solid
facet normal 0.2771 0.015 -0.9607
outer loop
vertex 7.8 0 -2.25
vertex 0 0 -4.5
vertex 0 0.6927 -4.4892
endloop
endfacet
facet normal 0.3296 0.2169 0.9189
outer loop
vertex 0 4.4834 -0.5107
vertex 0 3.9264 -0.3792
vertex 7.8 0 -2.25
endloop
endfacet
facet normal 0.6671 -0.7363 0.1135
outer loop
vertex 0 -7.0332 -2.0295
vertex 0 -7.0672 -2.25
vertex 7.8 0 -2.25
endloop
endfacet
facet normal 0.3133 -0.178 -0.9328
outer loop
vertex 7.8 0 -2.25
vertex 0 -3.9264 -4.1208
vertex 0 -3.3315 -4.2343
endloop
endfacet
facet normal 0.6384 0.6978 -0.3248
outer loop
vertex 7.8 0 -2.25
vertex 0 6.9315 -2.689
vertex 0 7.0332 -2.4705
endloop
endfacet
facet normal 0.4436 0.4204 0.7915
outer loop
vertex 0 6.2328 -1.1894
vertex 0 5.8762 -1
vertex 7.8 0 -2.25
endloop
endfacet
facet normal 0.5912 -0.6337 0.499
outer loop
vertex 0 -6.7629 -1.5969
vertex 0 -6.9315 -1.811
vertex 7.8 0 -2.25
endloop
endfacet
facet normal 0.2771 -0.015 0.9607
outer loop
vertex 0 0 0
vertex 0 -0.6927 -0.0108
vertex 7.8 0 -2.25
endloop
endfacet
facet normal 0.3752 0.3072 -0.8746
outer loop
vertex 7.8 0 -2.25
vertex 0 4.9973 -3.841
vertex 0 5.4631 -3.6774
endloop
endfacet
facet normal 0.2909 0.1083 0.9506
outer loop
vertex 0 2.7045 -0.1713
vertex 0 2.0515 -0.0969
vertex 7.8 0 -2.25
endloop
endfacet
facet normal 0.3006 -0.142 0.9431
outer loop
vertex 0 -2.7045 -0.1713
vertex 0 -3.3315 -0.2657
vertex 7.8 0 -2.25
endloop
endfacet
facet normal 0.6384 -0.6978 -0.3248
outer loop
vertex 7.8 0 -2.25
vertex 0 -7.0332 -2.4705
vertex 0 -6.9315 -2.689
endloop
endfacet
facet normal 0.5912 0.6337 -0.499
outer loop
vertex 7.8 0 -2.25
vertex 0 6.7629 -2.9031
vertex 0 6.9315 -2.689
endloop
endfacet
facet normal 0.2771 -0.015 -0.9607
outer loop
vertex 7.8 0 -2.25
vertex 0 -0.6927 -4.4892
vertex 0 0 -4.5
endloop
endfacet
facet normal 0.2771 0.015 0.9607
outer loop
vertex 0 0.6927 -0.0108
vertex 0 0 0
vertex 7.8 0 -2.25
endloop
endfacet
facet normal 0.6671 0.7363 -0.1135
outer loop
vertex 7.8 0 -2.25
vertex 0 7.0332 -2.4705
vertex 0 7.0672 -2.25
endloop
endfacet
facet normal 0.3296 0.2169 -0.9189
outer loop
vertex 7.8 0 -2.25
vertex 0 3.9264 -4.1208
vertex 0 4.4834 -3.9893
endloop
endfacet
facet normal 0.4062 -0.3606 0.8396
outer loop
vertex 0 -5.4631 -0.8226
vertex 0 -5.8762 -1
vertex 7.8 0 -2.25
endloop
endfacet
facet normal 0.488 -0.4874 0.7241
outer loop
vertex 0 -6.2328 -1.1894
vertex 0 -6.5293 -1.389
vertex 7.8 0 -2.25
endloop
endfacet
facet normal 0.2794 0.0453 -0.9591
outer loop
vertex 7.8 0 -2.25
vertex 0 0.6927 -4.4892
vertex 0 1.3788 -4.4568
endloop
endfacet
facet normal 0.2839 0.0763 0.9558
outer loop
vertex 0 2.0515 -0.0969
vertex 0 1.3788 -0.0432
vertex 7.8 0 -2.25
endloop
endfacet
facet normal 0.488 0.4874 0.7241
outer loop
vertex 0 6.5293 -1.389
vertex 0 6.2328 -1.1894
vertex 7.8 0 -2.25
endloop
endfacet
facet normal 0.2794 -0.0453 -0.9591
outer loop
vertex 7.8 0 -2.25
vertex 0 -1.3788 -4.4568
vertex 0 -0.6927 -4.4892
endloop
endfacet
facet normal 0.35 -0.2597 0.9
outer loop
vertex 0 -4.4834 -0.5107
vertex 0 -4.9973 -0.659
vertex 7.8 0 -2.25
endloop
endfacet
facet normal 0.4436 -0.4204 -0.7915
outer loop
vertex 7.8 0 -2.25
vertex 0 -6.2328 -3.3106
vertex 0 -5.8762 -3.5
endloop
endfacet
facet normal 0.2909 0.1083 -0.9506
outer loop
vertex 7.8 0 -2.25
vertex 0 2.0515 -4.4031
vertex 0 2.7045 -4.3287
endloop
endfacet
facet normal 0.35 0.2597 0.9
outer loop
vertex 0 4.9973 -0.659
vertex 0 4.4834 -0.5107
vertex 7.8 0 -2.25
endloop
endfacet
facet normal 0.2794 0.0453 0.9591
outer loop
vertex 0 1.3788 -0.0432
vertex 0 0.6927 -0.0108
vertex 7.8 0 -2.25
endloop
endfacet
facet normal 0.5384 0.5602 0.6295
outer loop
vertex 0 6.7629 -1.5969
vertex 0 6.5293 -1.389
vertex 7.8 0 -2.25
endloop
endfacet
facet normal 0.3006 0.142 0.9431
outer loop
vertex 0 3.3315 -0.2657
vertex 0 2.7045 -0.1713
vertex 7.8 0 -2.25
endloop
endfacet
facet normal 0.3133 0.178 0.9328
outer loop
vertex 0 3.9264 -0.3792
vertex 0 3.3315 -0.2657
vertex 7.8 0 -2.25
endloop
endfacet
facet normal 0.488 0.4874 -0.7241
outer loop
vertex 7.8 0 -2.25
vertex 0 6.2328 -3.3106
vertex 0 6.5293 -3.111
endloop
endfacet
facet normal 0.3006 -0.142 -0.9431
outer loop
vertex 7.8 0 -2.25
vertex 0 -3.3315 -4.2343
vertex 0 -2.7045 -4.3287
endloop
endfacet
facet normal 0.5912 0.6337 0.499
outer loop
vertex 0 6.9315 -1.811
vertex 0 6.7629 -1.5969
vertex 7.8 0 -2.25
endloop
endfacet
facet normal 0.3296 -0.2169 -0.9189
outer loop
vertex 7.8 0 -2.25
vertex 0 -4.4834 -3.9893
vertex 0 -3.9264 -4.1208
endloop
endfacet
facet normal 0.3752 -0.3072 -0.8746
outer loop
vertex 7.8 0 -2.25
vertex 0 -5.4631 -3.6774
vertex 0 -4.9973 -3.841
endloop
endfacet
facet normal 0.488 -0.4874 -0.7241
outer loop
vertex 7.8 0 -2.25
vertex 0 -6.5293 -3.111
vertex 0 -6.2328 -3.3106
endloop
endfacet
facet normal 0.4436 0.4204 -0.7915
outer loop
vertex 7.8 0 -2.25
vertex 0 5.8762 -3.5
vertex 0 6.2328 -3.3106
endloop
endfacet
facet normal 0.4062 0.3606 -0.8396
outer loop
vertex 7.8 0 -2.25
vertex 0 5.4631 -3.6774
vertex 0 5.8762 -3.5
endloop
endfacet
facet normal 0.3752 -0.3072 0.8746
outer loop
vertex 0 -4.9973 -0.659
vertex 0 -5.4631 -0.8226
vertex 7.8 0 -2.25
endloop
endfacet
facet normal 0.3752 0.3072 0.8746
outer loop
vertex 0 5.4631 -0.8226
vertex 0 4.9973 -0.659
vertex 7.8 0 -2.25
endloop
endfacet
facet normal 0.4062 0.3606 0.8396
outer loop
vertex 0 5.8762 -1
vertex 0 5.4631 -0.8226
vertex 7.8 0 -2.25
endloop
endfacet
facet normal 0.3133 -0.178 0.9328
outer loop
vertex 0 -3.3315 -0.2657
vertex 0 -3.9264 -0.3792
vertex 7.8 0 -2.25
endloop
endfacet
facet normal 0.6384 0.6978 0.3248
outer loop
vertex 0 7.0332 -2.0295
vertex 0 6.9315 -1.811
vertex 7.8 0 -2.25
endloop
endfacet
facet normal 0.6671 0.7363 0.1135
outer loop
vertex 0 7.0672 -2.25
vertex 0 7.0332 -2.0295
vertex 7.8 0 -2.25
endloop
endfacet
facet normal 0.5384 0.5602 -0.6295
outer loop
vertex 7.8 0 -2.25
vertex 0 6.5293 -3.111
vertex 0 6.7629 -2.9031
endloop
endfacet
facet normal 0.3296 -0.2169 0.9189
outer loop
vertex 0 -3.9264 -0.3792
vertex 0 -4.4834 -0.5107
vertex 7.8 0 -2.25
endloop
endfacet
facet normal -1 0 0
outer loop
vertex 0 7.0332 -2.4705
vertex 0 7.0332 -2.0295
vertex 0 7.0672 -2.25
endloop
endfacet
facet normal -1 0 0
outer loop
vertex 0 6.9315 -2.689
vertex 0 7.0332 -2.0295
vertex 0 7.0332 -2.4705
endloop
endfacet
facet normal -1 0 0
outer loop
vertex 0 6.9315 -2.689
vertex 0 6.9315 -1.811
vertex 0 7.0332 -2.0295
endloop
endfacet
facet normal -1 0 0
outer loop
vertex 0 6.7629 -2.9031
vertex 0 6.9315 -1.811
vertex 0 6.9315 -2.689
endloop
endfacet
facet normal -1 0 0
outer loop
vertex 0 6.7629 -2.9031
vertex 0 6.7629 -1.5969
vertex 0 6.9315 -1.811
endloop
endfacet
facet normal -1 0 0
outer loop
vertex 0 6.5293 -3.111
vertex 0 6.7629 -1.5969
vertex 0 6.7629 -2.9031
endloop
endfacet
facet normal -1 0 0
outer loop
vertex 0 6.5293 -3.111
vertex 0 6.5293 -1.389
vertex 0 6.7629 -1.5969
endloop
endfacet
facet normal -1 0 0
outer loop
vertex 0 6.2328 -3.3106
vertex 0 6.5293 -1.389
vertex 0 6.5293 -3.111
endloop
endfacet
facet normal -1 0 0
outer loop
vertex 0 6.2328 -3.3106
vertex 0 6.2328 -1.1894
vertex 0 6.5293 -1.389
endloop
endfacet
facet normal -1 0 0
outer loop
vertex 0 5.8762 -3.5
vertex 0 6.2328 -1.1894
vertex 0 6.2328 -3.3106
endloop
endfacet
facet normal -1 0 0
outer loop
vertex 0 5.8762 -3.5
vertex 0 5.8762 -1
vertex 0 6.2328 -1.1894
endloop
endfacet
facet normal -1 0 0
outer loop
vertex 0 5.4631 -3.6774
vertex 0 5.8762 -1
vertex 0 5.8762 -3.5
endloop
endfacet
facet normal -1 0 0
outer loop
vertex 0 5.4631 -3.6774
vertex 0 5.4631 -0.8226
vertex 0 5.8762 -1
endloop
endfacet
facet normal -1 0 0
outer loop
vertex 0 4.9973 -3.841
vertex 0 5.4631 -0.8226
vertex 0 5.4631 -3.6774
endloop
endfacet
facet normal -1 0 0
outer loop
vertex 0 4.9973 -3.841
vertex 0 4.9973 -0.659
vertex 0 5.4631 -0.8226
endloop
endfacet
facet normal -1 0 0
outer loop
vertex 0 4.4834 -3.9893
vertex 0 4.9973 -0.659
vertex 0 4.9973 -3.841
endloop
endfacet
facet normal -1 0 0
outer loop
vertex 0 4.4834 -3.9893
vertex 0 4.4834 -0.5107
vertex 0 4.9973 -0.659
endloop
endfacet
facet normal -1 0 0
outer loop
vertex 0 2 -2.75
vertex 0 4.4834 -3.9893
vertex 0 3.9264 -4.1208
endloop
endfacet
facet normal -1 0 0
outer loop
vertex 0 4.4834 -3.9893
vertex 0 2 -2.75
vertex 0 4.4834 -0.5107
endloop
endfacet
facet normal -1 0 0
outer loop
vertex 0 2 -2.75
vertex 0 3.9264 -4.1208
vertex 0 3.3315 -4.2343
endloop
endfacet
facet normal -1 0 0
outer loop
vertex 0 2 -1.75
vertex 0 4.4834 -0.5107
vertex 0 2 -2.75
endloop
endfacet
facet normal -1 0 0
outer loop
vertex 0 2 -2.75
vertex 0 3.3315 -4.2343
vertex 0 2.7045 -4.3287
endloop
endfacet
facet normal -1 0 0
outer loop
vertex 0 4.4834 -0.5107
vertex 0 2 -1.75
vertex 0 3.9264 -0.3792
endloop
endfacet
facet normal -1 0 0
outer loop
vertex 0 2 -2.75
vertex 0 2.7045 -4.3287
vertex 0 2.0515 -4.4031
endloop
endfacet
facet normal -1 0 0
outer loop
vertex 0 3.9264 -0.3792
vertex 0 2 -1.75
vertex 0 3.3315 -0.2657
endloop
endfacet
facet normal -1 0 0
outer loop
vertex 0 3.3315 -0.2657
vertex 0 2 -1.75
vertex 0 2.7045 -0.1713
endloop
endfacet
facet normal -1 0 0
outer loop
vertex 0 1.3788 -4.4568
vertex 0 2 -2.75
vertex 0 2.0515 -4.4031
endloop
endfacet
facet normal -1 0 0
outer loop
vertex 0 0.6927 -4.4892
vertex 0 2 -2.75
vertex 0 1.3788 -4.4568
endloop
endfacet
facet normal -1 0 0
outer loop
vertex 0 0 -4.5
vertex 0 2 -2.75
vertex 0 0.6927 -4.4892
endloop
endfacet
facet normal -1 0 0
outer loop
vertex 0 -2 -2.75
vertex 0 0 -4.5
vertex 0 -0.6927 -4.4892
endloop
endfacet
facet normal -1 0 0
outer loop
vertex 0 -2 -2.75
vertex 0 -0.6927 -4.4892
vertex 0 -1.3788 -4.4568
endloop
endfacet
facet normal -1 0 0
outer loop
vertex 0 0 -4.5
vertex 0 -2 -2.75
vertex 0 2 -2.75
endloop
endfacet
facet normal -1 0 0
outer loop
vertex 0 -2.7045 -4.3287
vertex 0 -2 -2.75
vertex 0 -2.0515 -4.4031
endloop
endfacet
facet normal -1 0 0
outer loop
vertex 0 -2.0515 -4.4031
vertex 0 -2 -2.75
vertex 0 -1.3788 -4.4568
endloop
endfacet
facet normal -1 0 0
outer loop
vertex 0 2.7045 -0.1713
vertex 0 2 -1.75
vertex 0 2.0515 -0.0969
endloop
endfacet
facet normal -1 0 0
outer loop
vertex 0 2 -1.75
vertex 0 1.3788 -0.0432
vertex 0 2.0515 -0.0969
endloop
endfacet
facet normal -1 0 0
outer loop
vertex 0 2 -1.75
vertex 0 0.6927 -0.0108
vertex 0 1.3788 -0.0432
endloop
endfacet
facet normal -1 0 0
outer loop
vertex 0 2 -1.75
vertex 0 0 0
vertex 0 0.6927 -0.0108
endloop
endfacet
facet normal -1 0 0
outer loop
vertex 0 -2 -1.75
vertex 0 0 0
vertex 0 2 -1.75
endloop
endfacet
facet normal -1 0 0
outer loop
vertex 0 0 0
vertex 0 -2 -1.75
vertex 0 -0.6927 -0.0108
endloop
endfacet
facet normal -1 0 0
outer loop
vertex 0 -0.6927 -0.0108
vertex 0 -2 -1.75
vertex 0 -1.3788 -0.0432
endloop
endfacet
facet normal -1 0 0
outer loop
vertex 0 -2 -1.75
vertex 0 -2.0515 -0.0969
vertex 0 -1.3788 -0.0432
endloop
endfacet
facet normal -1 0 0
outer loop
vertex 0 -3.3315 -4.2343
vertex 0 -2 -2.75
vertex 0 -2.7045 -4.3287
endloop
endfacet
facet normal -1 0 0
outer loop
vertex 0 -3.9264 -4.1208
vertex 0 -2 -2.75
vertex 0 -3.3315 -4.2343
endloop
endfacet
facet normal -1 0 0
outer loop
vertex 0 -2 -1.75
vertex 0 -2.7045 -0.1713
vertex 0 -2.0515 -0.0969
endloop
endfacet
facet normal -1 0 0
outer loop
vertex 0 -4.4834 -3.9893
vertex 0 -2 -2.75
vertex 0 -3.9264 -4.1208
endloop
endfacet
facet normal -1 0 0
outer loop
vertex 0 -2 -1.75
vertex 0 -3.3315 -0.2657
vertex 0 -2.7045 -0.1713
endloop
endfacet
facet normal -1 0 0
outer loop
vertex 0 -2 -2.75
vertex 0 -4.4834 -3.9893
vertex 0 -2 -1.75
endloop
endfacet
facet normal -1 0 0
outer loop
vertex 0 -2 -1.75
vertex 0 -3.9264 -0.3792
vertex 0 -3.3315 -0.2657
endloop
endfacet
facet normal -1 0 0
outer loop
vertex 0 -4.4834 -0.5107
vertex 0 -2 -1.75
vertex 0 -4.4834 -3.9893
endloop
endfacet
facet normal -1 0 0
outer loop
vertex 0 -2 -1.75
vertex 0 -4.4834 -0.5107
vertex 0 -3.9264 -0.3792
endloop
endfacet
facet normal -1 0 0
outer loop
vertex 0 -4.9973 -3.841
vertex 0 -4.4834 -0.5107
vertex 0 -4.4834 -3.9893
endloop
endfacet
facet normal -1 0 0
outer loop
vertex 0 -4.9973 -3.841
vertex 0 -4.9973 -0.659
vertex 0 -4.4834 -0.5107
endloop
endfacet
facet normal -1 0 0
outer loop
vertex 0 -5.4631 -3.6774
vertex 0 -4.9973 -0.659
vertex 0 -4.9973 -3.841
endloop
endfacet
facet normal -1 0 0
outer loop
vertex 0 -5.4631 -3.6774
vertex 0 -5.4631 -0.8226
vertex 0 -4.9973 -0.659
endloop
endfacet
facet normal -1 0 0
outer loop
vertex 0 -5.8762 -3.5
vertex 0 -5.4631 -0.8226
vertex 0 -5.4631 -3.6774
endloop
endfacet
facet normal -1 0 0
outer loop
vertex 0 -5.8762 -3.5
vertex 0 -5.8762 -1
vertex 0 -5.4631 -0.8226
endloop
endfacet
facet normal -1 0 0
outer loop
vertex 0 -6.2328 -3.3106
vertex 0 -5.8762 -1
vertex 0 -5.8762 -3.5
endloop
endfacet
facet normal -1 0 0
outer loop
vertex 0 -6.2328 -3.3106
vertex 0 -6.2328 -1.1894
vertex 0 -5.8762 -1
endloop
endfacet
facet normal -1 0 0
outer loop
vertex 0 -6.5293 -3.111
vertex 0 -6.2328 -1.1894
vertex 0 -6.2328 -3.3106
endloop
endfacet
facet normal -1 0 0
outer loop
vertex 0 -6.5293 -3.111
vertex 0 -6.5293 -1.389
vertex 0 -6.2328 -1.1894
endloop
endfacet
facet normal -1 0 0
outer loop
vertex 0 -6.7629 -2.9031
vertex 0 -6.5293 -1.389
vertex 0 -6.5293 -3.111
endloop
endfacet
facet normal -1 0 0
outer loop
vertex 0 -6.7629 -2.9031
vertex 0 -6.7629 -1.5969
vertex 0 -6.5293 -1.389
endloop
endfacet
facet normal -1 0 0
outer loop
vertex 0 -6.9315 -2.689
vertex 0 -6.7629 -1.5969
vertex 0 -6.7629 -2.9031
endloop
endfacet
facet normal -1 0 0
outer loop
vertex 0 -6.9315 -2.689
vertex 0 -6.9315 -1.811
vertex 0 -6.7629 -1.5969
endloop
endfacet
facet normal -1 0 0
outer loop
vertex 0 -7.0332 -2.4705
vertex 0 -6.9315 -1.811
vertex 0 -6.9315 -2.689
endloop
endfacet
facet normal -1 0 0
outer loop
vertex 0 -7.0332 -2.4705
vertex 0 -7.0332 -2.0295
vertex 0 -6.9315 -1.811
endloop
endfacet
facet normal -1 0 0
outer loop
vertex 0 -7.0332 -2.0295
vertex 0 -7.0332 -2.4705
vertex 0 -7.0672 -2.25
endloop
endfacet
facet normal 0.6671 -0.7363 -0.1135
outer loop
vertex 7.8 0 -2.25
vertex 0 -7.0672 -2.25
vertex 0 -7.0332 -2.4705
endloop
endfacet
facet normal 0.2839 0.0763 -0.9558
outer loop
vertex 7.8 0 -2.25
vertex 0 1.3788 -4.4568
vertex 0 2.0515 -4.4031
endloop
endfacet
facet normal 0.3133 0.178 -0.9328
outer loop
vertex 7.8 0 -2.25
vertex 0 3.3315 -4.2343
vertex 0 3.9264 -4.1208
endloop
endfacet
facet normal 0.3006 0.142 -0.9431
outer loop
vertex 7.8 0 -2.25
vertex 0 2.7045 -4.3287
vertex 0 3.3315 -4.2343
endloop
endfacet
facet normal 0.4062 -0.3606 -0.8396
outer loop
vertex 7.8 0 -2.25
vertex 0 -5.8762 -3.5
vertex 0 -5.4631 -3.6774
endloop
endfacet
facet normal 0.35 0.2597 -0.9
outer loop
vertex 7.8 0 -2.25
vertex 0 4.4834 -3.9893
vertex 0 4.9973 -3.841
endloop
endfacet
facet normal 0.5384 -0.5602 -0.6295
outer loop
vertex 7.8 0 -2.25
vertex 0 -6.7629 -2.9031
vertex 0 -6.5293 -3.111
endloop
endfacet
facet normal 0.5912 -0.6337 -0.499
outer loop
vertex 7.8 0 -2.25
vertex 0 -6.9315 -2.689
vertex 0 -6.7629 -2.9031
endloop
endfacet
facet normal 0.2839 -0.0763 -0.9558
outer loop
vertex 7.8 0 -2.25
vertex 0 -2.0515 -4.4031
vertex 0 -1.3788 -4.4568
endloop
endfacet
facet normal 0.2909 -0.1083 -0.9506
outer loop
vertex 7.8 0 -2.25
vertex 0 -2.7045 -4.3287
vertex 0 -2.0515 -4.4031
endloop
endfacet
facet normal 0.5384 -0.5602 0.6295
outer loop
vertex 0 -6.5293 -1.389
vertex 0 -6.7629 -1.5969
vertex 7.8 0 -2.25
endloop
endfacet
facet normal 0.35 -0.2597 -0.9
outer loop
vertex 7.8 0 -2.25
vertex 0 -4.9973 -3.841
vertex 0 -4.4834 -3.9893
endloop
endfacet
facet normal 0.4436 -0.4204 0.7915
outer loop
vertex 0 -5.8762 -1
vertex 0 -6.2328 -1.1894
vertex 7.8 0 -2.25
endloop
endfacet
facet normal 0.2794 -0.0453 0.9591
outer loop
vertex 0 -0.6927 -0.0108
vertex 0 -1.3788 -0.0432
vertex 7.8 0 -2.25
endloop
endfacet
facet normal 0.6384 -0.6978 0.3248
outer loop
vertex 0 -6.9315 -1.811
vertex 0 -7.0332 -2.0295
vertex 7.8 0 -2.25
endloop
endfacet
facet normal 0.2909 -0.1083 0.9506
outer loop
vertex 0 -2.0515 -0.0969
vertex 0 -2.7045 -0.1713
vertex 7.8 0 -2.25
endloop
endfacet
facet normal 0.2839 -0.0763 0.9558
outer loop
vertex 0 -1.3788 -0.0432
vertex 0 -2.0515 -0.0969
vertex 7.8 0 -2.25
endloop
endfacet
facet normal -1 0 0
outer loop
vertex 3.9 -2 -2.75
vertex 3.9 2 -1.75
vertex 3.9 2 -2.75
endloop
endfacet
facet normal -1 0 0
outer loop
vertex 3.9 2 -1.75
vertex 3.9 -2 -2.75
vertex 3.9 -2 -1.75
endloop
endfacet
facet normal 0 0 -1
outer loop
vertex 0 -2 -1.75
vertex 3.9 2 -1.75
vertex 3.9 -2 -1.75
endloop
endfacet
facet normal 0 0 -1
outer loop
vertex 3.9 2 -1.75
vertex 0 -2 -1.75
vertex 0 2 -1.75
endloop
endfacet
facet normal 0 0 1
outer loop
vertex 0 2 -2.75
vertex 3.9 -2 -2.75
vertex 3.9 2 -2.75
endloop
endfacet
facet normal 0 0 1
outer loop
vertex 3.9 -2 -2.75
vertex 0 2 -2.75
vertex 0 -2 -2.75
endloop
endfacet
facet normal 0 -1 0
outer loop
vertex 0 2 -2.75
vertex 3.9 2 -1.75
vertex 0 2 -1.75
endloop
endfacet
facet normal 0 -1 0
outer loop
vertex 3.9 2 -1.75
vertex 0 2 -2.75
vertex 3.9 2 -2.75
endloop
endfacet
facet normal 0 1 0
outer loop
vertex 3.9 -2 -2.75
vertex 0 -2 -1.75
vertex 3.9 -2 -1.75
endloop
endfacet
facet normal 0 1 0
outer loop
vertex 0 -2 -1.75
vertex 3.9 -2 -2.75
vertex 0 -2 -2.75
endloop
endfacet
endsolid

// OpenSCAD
module spindle() {
    difference() {
        // Outer faceted body
        scale([1, 3.141, 1]) {
            rotate([0, 90, 0]) {
                cylinder(h=7.8, r1=2.25, r2=0, $fn=64);
            }
        }
        // Central slot
        translate([-3.9, -12.25, -2.25]) {
            scale([1, 3.141, 1]) {
                rotate([0, 90, 0]) {
                    cylinder(h=6.8, r=1.5, $fn=64);
                }
            }
        }
        // Side notches
        translate([-3.9, -2, -0.5]) {
            cube([7.8, 4, 1]);
        }
        translate([-3.9, -2, -3.5]) {
            cube([7.8, 4, 1]);
        }
    }
}

translate([0, 0, -2.25]) {
    spindle();
}
